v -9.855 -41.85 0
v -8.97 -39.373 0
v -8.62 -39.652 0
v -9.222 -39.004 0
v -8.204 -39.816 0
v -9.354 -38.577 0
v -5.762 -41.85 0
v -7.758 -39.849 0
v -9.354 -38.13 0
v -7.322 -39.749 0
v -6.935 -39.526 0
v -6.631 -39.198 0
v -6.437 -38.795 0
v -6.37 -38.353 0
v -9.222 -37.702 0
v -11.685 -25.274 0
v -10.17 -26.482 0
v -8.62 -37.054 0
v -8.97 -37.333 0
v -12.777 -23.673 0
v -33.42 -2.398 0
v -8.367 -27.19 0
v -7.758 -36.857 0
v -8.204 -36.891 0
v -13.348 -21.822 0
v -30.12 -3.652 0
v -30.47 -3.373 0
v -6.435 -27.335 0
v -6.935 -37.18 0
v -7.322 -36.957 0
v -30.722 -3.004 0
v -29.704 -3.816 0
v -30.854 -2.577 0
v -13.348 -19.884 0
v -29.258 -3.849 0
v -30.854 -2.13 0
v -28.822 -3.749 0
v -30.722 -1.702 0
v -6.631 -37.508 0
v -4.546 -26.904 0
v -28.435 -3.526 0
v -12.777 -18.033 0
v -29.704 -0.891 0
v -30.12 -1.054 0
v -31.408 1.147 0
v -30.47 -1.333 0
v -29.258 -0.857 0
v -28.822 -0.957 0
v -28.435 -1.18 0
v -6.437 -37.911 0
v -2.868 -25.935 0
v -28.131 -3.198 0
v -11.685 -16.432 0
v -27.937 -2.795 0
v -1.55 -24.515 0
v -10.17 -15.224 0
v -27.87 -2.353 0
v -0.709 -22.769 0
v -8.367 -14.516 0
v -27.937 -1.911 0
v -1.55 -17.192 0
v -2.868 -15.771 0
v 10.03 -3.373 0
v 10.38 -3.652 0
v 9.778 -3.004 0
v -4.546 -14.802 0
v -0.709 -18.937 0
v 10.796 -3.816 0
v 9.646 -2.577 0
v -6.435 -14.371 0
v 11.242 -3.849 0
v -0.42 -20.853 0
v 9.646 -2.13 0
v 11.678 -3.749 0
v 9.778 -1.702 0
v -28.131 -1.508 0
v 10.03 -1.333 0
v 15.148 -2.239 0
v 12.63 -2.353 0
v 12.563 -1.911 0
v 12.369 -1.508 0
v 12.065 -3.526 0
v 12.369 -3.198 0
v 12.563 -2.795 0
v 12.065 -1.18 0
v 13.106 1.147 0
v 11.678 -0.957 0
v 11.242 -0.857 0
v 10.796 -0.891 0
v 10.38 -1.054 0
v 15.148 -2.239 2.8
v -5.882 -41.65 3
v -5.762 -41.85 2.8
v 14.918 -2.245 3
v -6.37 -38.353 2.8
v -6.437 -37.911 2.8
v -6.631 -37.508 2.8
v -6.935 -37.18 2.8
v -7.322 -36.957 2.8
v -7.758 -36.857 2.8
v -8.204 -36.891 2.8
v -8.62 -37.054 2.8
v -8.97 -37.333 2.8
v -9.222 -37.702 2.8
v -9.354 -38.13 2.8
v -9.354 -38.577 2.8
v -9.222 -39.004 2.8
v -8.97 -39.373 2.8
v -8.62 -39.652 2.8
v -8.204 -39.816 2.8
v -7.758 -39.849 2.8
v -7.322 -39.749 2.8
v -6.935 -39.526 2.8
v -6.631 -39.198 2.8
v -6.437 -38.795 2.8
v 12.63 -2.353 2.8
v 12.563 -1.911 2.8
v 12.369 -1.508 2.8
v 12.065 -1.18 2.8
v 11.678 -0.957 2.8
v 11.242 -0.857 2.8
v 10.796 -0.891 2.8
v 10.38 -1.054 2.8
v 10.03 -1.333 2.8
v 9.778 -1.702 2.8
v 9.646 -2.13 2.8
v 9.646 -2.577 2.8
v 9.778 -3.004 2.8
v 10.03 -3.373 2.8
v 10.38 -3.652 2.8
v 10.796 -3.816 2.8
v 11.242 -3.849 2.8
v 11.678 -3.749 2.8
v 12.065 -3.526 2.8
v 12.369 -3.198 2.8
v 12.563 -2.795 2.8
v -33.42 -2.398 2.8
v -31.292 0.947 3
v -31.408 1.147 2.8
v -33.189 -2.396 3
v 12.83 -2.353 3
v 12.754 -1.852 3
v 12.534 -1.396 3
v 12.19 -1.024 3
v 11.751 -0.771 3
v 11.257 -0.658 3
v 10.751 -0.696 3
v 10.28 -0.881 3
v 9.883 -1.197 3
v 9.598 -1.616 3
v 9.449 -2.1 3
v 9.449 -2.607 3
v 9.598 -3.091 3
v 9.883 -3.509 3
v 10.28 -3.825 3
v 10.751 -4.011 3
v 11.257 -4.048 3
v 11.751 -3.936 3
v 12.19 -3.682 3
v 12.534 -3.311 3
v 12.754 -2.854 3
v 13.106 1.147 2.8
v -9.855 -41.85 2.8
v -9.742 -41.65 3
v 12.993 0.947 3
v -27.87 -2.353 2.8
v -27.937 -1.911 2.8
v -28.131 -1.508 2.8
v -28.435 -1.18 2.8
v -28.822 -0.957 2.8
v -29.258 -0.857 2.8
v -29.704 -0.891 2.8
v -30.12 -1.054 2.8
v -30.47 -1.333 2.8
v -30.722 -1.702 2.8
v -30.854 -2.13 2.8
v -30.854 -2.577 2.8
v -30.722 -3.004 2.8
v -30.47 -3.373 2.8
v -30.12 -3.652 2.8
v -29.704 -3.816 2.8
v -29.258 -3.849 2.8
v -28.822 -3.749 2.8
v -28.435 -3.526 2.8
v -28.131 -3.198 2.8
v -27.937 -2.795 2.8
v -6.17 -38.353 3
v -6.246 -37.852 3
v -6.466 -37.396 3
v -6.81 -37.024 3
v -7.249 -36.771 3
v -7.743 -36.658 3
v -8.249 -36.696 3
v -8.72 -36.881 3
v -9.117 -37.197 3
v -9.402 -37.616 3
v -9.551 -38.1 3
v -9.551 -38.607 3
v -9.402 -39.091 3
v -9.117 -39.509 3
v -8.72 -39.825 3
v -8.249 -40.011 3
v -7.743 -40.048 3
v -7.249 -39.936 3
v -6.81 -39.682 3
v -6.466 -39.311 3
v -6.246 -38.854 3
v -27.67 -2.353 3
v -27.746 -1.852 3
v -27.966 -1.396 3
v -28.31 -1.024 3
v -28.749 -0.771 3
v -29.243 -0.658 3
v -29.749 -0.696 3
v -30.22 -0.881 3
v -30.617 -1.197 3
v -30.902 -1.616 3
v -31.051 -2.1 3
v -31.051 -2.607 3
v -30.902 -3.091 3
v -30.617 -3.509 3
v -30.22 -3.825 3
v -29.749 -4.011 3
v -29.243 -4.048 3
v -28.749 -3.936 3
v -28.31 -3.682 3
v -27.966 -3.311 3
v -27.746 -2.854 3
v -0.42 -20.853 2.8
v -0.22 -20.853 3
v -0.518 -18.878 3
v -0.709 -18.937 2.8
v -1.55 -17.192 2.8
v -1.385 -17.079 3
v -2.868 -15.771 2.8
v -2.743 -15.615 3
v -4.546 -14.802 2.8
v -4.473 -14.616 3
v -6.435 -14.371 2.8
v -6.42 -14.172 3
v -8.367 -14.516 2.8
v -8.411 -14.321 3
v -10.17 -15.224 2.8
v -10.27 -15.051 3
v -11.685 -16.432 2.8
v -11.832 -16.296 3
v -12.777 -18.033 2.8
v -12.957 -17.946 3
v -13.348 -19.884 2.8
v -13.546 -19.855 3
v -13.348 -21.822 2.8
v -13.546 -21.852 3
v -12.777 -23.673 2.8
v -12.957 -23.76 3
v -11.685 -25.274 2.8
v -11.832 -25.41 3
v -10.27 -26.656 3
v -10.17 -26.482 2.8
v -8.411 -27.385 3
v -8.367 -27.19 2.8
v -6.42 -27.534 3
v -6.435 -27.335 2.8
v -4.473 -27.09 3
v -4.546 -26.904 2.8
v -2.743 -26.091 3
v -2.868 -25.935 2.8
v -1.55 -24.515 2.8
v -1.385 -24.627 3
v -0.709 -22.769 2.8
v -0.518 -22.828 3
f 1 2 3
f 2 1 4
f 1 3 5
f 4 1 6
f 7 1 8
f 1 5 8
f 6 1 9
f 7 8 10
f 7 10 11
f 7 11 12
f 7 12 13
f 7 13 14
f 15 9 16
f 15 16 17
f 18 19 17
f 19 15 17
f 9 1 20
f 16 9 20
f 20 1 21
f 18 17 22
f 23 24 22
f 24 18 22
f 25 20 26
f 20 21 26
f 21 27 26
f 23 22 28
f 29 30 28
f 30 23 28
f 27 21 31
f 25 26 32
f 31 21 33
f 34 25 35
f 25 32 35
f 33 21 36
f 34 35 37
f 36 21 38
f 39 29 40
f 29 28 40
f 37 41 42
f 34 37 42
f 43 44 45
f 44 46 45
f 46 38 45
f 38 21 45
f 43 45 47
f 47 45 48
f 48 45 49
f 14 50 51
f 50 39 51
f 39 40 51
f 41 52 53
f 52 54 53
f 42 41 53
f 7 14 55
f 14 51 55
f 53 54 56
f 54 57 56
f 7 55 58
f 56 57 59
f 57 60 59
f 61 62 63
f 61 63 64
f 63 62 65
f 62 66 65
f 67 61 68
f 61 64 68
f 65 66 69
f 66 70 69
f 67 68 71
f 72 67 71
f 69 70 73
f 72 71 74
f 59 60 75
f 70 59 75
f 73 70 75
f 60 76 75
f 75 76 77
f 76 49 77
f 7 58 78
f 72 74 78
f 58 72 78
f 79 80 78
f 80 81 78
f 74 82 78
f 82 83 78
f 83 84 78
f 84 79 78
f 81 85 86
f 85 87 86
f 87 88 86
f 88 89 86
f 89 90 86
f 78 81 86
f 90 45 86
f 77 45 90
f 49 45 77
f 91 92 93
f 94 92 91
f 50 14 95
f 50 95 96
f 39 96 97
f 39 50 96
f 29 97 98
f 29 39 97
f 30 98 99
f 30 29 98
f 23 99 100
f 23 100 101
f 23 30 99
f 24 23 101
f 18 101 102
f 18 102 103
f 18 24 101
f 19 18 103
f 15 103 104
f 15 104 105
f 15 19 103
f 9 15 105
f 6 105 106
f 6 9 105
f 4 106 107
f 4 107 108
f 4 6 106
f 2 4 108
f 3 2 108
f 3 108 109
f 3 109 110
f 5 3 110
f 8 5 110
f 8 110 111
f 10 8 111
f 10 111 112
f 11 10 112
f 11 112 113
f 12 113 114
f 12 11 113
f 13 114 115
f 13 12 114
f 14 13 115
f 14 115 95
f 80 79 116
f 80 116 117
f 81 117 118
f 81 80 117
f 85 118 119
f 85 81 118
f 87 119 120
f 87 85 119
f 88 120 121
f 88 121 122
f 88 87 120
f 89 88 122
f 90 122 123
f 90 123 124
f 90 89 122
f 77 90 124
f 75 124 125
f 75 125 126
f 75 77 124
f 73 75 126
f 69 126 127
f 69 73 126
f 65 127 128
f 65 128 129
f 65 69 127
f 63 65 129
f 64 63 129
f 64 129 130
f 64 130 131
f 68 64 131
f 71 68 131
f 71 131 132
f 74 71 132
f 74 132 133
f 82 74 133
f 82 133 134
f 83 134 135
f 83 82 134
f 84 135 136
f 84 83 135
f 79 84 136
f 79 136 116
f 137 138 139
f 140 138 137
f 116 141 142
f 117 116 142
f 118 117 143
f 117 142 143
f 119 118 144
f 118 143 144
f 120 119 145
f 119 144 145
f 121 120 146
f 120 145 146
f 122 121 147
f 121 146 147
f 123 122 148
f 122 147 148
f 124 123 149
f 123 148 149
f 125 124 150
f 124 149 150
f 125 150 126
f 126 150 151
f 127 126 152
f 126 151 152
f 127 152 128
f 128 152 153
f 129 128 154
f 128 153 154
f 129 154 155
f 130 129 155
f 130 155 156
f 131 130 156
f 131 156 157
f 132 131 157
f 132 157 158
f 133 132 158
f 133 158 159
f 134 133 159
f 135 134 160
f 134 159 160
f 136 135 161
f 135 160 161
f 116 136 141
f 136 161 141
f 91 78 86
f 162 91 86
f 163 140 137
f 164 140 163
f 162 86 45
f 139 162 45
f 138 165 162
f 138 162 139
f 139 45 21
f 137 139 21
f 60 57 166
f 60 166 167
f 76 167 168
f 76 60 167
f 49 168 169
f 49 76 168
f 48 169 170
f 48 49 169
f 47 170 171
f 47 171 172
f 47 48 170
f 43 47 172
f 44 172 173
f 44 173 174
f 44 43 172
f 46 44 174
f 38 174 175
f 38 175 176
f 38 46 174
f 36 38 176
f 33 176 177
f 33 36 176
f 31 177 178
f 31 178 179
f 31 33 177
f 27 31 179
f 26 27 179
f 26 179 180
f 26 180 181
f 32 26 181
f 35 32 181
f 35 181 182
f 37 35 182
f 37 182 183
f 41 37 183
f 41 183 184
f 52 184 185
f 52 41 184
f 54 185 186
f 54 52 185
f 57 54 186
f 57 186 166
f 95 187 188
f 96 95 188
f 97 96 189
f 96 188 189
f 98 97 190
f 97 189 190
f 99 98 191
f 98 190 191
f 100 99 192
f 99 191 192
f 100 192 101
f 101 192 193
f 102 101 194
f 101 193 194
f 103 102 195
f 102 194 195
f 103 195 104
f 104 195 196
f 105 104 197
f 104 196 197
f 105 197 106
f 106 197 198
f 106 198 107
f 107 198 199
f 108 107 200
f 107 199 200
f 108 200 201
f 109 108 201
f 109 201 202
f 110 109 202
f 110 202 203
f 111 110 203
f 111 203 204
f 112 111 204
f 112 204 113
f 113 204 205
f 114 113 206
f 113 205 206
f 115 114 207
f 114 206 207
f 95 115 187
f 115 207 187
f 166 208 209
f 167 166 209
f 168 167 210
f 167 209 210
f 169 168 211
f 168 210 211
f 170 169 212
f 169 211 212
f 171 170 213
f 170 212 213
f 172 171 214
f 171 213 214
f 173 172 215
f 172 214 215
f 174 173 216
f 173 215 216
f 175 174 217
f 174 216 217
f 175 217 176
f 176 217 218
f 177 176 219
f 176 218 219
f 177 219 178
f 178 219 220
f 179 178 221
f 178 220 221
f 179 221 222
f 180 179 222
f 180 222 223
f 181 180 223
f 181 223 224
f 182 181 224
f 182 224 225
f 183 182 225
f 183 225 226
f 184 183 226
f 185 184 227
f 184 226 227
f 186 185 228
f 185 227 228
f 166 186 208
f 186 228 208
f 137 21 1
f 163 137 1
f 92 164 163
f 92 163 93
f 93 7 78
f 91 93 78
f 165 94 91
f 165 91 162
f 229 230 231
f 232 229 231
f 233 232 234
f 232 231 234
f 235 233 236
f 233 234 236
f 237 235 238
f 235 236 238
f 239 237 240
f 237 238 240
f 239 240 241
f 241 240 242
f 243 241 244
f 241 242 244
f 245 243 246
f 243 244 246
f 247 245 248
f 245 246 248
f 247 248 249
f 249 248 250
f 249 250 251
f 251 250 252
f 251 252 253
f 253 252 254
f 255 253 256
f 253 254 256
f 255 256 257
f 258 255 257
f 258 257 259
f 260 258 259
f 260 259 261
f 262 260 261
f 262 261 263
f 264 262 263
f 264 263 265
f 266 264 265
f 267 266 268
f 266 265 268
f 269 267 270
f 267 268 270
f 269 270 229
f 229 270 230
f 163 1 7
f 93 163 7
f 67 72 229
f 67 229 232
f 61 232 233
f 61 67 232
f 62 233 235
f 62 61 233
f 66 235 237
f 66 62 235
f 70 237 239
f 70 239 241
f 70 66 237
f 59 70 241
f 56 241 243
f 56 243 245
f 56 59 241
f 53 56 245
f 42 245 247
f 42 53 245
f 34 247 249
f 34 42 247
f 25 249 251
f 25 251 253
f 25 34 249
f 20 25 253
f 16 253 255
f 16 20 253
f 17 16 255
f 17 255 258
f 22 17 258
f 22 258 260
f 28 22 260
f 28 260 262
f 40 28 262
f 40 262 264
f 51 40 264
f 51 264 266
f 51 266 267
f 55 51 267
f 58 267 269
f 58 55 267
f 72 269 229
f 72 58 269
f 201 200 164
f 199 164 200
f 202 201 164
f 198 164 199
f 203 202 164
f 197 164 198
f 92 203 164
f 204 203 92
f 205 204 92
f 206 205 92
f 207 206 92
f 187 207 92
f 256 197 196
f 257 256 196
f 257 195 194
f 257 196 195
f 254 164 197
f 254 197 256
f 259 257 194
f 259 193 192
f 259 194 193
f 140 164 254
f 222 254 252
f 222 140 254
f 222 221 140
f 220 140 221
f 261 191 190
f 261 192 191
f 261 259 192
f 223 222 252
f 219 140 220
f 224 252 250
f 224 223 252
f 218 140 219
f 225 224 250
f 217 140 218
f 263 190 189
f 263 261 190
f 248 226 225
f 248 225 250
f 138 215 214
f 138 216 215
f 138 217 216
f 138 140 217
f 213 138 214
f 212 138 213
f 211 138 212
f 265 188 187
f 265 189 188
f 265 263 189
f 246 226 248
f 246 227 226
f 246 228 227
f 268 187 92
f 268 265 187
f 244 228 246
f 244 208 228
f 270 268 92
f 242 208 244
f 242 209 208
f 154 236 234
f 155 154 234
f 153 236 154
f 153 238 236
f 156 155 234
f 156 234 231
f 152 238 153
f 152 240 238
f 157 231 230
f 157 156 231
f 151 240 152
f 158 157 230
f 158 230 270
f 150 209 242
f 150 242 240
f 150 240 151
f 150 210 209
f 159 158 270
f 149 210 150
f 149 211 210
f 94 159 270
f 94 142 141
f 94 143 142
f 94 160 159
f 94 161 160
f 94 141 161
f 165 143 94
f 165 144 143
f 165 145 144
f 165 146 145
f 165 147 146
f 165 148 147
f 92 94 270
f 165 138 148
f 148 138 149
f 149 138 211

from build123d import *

# Parameters (mm, degrees)
F0_R     = 1.5
F0_R_2   = 6.5
F1_DEPTH = 3
F2_SIZE  = 0.2


with BuildPart() as f1:
    # F0 (on Top) → F1 (new body)
    with BuildSketch(Plane.XY):
        Polygon((-5.761886, -41.850388), (15.147641, -2.238909), (13.106366, 1.146824), (-31.408452, 1.146824), (-33.420278, -2.398261), (-9.855032, -41.850388), align=None)
        with Locations((-7.870373, -38.353176)):
            Circle(F0_R, mode=Mode.SUBTRACT)
        with Locations((-6.920373, -20.853176)):
            Circle(F0_R_2, mode=Mode.SUBTRACT)
        with Locations((-29.370373, -2.353176)):
            Circle(F0_R, mode=Mode.SUBTRACT)
        with Locations((11.129627, -2.353176)):
            Circle(F0_R, mode=Mode.SUBTRACT)
    extrude(amount=F1_DEPTH)

    # F2
    f2_edges = [f1.edges().sort_by_distance(p)[0] for p in [
        (-21.637655, -22.124324, 3),
        (-7.808459, -41.850388, 3),
        (4.692878, -22.044649, 3),
        (14.127004, -0.546043, 3),
        (-9.151043, 1.146824, 3),
        (-32.414365, -0.625718, 3),
        (-9.370373, -38.353176, 3),
        (-13.420373, -20.853176, 3),
        (-30.870373, -2.353176, 3),
        (9.629627, -2.353176, 3),
    ]]
    chamfer(f2_edges, length=F2_SIZE)


solid = f1.part
